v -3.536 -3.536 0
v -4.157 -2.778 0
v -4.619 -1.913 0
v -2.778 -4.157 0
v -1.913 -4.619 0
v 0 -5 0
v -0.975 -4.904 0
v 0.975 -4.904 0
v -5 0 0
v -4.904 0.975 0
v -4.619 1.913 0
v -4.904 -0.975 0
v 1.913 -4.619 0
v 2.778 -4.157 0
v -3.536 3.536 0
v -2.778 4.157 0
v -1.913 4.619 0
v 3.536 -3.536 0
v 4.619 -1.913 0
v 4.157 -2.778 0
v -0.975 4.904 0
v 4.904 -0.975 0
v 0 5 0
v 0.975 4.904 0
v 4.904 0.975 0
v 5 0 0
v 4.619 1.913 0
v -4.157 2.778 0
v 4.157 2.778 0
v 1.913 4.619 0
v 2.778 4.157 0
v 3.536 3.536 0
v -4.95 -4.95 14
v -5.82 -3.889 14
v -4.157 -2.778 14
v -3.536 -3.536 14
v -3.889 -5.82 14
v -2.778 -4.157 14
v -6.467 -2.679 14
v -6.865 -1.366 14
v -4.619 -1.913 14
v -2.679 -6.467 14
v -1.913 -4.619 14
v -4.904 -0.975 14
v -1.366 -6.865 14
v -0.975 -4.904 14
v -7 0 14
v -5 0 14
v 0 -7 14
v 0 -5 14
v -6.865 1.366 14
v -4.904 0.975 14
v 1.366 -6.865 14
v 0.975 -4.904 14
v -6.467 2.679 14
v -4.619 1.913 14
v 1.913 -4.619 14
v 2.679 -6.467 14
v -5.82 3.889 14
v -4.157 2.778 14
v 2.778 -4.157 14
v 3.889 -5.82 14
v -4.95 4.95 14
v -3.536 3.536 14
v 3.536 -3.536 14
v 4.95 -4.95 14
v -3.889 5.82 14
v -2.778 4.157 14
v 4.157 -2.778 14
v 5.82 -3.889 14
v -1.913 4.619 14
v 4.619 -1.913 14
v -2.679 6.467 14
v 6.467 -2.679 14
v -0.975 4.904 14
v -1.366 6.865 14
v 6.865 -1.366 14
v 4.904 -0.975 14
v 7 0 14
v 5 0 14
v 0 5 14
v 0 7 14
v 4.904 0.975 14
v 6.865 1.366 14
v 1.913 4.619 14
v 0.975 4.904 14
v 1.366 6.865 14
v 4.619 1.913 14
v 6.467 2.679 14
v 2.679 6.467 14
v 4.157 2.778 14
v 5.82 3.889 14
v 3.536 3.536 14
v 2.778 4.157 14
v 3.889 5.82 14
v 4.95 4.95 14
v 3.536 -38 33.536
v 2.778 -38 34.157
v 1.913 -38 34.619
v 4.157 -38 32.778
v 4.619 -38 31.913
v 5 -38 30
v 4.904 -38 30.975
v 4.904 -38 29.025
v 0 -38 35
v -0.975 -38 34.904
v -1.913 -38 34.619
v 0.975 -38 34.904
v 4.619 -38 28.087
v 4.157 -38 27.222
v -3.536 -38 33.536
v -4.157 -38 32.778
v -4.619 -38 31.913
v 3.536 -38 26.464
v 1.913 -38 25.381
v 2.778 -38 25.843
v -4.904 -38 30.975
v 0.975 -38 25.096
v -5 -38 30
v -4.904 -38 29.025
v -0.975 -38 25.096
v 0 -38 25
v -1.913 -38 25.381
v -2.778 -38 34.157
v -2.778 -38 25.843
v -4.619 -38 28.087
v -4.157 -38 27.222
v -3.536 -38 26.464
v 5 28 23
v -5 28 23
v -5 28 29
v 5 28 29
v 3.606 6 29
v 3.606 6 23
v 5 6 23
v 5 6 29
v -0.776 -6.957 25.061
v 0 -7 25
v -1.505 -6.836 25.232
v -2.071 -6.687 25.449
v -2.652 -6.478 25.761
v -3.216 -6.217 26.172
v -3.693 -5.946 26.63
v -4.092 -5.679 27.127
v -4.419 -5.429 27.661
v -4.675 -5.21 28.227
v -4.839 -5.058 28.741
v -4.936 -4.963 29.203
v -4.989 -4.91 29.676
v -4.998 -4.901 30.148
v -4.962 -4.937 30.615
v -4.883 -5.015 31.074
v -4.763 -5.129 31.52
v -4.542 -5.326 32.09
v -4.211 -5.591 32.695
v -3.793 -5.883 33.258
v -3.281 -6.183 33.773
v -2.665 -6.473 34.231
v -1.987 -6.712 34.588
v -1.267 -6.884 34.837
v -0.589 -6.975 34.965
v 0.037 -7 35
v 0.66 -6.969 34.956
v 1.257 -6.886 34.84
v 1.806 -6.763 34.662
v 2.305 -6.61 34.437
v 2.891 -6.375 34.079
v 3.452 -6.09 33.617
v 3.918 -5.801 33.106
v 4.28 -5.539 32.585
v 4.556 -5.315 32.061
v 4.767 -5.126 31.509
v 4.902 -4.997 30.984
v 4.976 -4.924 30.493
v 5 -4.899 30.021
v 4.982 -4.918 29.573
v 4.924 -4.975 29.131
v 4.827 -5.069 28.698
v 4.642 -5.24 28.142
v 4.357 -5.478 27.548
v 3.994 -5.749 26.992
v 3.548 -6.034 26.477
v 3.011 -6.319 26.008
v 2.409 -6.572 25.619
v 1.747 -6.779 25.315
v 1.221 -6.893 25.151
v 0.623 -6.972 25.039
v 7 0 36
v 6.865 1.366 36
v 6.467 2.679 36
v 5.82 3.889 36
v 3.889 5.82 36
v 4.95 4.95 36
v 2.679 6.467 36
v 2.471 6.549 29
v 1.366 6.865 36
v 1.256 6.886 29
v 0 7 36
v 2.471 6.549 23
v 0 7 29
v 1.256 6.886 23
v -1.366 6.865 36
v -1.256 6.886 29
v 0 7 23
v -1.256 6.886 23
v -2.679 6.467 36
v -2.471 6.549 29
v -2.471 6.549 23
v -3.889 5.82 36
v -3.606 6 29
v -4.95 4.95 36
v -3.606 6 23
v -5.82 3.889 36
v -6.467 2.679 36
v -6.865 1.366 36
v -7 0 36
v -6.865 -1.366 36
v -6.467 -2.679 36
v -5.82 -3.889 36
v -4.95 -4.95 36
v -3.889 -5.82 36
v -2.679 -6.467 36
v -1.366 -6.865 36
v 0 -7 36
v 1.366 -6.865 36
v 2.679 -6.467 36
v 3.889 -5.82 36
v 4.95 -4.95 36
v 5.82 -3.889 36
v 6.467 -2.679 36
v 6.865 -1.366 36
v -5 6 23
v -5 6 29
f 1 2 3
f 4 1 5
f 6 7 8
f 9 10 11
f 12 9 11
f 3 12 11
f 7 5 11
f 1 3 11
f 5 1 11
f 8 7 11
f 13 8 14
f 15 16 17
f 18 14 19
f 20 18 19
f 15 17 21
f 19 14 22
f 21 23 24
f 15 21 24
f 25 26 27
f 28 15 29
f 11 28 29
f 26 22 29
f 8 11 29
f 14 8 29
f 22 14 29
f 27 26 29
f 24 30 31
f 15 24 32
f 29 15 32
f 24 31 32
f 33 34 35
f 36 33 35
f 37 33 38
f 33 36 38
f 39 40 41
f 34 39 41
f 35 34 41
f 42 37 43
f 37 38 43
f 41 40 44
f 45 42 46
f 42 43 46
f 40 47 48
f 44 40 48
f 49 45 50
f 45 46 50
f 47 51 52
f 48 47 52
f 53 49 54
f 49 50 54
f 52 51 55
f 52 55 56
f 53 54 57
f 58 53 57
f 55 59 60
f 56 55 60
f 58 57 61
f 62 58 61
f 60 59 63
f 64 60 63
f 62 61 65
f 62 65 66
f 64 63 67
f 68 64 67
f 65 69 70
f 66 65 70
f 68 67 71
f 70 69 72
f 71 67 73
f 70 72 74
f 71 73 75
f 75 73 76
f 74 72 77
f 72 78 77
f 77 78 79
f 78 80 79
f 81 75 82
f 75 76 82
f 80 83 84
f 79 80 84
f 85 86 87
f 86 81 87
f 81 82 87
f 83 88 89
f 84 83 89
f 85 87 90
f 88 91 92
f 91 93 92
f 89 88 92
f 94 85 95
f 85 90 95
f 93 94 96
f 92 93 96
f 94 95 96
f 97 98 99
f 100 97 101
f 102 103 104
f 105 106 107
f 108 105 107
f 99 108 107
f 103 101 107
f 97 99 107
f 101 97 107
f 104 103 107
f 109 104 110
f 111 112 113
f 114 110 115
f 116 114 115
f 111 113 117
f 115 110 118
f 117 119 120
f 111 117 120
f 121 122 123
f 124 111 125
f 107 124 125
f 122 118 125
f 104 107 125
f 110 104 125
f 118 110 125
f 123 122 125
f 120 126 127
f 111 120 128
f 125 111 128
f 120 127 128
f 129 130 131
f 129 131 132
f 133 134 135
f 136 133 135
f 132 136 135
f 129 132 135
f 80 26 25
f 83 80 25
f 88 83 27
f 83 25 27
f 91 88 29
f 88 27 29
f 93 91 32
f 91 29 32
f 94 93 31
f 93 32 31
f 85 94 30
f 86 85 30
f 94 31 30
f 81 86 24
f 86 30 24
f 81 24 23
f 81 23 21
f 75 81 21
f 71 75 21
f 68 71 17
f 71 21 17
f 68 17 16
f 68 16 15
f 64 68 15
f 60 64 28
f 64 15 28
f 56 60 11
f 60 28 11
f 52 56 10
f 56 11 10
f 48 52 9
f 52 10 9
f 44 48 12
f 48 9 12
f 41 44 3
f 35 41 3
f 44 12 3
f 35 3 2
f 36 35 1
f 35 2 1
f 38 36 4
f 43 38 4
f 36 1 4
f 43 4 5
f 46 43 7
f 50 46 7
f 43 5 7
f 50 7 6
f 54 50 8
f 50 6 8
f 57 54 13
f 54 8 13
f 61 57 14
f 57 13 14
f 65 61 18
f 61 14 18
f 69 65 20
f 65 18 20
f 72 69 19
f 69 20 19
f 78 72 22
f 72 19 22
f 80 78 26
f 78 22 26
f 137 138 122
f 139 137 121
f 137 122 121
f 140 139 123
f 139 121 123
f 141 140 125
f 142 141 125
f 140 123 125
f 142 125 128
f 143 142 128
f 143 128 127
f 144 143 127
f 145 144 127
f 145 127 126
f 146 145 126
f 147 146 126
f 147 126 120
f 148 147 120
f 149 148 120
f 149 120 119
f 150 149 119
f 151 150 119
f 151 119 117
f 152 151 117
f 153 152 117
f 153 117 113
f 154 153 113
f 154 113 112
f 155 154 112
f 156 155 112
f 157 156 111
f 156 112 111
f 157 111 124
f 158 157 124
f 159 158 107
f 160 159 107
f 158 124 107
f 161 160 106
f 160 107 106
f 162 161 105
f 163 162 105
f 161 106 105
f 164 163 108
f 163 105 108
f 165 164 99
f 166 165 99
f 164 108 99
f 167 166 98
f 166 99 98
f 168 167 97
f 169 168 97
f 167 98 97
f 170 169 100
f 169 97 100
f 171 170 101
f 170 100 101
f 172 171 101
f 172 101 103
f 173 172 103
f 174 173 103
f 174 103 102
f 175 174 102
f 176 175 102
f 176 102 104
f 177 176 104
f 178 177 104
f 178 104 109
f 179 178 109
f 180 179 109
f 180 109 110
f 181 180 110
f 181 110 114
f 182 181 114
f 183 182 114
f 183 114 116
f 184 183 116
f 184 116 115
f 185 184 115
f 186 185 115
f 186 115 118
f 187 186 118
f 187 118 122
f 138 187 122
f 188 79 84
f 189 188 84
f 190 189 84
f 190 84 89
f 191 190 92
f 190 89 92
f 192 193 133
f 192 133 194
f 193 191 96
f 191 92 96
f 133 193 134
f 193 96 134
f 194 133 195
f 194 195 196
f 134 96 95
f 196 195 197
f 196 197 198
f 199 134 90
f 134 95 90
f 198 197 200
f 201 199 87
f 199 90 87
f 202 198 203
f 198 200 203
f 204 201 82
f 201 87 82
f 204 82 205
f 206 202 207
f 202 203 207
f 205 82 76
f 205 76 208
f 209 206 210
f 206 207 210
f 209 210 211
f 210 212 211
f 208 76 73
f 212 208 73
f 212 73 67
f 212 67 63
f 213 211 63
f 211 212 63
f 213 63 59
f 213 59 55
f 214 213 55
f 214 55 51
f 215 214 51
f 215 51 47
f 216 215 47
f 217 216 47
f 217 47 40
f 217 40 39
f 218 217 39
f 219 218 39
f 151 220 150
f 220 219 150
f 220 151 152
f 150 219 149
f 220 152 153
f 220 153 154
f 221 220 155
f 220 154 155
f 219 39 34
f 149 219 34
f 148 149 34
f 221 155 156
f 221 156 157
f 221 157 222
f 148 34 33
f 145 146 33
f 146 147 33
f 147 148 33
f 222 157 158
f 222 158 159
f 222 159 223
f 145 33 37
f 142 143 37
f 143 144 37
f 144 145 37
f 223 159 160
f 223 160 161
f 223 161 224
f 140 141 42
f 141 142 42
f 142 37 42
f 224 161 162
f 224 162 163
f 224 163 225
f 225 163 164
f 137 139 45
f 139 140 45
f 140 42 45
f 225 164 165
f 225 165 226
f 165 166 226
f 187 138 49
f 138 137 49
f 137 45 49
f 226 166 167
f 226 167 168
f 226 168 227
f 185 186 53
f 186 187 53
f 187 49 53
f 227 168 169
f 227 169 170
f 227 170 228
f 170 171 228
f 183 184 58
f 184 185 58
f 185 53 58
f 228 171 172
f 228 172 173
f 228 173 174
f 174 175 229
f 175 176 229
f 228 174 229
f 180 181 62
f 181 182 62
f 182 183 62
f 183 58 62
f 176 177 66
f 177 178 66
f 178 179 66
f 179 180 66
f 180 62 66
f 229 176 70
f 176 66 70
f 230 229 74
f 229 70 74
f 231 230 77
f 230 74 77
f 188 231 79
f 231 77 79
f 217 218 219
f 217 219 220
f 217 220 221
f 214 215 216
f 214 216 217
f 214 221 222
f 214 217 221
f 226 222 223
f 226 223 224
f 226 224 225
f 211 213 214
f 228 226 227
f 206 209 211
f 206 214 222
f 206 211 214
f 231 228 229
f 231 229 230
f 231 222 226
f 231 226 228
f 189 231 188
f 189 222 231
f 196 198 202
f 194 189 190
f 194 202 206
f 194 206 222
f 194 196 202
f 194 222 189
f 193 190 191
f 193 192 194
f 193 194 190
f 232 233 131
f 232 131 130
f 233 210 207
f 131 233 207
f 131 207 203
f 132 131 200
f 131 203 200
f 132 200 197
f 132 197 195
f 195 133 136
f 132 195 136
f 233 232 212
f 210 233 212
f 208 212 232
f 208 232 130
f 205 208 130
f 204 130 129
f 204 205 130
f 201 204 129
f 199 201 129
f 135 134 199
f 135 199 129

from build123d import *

# Parameters (mm, degrees)
SKETCH1_R    = 5
SPIGOT_DEPTH = 14
BODY_START   = 14
SKETCH2_R    = 7
BODY_DEPTH   = 22
SPOUT_START  = -38
SKETCH3_R    = 5
SPOUT_DEPTH  = 38
LEVER_START  = 6
SKETCH4_W    = 10
SKETCH4_H    = 6
LEVER_DEPTH  = 22


with BuildPart() as part:
    # Sketch1 → Spigot (new body)
    with BuildSketch(Plane.XY):
        Circle(SKETCH1_R)
    extrude(amount=SPIGOT_DEPTH)

    # Sketch2 → Body (add)
    with BuildSketch(Plane.XY.offset(BODY_START)):
        Circle(SKETCH2_R)
    extrude(amount=BODY_DEPTH)

    # Sketch3 → Spout (add)
    with BuildSketch(Plane(origin=(0, 0, 0), x_dir=(1, 0, 0), z_dir=(0, 1, 0)).offset(SPOUT_START)):
        with Locations(Location((0, -30, 0), (0, 0, 90))):
            Circle(SKETCH3_R)
    extrude(amount=SPOUT_DEPTH)

    # Sketch4 → Lever (add)
    with BuildSketch(Plane(origin=(0, 0, 0), x_dir=(1, 0, 0), z_dir=(0, 1, 0)).offset(LEVER_START)):
        with Locations((0, -26)):
            Rectangle(SKETCH4_W, SKETCH4_H)
    extrude(amount=LEVER_DEPTH)


solid = part.part
